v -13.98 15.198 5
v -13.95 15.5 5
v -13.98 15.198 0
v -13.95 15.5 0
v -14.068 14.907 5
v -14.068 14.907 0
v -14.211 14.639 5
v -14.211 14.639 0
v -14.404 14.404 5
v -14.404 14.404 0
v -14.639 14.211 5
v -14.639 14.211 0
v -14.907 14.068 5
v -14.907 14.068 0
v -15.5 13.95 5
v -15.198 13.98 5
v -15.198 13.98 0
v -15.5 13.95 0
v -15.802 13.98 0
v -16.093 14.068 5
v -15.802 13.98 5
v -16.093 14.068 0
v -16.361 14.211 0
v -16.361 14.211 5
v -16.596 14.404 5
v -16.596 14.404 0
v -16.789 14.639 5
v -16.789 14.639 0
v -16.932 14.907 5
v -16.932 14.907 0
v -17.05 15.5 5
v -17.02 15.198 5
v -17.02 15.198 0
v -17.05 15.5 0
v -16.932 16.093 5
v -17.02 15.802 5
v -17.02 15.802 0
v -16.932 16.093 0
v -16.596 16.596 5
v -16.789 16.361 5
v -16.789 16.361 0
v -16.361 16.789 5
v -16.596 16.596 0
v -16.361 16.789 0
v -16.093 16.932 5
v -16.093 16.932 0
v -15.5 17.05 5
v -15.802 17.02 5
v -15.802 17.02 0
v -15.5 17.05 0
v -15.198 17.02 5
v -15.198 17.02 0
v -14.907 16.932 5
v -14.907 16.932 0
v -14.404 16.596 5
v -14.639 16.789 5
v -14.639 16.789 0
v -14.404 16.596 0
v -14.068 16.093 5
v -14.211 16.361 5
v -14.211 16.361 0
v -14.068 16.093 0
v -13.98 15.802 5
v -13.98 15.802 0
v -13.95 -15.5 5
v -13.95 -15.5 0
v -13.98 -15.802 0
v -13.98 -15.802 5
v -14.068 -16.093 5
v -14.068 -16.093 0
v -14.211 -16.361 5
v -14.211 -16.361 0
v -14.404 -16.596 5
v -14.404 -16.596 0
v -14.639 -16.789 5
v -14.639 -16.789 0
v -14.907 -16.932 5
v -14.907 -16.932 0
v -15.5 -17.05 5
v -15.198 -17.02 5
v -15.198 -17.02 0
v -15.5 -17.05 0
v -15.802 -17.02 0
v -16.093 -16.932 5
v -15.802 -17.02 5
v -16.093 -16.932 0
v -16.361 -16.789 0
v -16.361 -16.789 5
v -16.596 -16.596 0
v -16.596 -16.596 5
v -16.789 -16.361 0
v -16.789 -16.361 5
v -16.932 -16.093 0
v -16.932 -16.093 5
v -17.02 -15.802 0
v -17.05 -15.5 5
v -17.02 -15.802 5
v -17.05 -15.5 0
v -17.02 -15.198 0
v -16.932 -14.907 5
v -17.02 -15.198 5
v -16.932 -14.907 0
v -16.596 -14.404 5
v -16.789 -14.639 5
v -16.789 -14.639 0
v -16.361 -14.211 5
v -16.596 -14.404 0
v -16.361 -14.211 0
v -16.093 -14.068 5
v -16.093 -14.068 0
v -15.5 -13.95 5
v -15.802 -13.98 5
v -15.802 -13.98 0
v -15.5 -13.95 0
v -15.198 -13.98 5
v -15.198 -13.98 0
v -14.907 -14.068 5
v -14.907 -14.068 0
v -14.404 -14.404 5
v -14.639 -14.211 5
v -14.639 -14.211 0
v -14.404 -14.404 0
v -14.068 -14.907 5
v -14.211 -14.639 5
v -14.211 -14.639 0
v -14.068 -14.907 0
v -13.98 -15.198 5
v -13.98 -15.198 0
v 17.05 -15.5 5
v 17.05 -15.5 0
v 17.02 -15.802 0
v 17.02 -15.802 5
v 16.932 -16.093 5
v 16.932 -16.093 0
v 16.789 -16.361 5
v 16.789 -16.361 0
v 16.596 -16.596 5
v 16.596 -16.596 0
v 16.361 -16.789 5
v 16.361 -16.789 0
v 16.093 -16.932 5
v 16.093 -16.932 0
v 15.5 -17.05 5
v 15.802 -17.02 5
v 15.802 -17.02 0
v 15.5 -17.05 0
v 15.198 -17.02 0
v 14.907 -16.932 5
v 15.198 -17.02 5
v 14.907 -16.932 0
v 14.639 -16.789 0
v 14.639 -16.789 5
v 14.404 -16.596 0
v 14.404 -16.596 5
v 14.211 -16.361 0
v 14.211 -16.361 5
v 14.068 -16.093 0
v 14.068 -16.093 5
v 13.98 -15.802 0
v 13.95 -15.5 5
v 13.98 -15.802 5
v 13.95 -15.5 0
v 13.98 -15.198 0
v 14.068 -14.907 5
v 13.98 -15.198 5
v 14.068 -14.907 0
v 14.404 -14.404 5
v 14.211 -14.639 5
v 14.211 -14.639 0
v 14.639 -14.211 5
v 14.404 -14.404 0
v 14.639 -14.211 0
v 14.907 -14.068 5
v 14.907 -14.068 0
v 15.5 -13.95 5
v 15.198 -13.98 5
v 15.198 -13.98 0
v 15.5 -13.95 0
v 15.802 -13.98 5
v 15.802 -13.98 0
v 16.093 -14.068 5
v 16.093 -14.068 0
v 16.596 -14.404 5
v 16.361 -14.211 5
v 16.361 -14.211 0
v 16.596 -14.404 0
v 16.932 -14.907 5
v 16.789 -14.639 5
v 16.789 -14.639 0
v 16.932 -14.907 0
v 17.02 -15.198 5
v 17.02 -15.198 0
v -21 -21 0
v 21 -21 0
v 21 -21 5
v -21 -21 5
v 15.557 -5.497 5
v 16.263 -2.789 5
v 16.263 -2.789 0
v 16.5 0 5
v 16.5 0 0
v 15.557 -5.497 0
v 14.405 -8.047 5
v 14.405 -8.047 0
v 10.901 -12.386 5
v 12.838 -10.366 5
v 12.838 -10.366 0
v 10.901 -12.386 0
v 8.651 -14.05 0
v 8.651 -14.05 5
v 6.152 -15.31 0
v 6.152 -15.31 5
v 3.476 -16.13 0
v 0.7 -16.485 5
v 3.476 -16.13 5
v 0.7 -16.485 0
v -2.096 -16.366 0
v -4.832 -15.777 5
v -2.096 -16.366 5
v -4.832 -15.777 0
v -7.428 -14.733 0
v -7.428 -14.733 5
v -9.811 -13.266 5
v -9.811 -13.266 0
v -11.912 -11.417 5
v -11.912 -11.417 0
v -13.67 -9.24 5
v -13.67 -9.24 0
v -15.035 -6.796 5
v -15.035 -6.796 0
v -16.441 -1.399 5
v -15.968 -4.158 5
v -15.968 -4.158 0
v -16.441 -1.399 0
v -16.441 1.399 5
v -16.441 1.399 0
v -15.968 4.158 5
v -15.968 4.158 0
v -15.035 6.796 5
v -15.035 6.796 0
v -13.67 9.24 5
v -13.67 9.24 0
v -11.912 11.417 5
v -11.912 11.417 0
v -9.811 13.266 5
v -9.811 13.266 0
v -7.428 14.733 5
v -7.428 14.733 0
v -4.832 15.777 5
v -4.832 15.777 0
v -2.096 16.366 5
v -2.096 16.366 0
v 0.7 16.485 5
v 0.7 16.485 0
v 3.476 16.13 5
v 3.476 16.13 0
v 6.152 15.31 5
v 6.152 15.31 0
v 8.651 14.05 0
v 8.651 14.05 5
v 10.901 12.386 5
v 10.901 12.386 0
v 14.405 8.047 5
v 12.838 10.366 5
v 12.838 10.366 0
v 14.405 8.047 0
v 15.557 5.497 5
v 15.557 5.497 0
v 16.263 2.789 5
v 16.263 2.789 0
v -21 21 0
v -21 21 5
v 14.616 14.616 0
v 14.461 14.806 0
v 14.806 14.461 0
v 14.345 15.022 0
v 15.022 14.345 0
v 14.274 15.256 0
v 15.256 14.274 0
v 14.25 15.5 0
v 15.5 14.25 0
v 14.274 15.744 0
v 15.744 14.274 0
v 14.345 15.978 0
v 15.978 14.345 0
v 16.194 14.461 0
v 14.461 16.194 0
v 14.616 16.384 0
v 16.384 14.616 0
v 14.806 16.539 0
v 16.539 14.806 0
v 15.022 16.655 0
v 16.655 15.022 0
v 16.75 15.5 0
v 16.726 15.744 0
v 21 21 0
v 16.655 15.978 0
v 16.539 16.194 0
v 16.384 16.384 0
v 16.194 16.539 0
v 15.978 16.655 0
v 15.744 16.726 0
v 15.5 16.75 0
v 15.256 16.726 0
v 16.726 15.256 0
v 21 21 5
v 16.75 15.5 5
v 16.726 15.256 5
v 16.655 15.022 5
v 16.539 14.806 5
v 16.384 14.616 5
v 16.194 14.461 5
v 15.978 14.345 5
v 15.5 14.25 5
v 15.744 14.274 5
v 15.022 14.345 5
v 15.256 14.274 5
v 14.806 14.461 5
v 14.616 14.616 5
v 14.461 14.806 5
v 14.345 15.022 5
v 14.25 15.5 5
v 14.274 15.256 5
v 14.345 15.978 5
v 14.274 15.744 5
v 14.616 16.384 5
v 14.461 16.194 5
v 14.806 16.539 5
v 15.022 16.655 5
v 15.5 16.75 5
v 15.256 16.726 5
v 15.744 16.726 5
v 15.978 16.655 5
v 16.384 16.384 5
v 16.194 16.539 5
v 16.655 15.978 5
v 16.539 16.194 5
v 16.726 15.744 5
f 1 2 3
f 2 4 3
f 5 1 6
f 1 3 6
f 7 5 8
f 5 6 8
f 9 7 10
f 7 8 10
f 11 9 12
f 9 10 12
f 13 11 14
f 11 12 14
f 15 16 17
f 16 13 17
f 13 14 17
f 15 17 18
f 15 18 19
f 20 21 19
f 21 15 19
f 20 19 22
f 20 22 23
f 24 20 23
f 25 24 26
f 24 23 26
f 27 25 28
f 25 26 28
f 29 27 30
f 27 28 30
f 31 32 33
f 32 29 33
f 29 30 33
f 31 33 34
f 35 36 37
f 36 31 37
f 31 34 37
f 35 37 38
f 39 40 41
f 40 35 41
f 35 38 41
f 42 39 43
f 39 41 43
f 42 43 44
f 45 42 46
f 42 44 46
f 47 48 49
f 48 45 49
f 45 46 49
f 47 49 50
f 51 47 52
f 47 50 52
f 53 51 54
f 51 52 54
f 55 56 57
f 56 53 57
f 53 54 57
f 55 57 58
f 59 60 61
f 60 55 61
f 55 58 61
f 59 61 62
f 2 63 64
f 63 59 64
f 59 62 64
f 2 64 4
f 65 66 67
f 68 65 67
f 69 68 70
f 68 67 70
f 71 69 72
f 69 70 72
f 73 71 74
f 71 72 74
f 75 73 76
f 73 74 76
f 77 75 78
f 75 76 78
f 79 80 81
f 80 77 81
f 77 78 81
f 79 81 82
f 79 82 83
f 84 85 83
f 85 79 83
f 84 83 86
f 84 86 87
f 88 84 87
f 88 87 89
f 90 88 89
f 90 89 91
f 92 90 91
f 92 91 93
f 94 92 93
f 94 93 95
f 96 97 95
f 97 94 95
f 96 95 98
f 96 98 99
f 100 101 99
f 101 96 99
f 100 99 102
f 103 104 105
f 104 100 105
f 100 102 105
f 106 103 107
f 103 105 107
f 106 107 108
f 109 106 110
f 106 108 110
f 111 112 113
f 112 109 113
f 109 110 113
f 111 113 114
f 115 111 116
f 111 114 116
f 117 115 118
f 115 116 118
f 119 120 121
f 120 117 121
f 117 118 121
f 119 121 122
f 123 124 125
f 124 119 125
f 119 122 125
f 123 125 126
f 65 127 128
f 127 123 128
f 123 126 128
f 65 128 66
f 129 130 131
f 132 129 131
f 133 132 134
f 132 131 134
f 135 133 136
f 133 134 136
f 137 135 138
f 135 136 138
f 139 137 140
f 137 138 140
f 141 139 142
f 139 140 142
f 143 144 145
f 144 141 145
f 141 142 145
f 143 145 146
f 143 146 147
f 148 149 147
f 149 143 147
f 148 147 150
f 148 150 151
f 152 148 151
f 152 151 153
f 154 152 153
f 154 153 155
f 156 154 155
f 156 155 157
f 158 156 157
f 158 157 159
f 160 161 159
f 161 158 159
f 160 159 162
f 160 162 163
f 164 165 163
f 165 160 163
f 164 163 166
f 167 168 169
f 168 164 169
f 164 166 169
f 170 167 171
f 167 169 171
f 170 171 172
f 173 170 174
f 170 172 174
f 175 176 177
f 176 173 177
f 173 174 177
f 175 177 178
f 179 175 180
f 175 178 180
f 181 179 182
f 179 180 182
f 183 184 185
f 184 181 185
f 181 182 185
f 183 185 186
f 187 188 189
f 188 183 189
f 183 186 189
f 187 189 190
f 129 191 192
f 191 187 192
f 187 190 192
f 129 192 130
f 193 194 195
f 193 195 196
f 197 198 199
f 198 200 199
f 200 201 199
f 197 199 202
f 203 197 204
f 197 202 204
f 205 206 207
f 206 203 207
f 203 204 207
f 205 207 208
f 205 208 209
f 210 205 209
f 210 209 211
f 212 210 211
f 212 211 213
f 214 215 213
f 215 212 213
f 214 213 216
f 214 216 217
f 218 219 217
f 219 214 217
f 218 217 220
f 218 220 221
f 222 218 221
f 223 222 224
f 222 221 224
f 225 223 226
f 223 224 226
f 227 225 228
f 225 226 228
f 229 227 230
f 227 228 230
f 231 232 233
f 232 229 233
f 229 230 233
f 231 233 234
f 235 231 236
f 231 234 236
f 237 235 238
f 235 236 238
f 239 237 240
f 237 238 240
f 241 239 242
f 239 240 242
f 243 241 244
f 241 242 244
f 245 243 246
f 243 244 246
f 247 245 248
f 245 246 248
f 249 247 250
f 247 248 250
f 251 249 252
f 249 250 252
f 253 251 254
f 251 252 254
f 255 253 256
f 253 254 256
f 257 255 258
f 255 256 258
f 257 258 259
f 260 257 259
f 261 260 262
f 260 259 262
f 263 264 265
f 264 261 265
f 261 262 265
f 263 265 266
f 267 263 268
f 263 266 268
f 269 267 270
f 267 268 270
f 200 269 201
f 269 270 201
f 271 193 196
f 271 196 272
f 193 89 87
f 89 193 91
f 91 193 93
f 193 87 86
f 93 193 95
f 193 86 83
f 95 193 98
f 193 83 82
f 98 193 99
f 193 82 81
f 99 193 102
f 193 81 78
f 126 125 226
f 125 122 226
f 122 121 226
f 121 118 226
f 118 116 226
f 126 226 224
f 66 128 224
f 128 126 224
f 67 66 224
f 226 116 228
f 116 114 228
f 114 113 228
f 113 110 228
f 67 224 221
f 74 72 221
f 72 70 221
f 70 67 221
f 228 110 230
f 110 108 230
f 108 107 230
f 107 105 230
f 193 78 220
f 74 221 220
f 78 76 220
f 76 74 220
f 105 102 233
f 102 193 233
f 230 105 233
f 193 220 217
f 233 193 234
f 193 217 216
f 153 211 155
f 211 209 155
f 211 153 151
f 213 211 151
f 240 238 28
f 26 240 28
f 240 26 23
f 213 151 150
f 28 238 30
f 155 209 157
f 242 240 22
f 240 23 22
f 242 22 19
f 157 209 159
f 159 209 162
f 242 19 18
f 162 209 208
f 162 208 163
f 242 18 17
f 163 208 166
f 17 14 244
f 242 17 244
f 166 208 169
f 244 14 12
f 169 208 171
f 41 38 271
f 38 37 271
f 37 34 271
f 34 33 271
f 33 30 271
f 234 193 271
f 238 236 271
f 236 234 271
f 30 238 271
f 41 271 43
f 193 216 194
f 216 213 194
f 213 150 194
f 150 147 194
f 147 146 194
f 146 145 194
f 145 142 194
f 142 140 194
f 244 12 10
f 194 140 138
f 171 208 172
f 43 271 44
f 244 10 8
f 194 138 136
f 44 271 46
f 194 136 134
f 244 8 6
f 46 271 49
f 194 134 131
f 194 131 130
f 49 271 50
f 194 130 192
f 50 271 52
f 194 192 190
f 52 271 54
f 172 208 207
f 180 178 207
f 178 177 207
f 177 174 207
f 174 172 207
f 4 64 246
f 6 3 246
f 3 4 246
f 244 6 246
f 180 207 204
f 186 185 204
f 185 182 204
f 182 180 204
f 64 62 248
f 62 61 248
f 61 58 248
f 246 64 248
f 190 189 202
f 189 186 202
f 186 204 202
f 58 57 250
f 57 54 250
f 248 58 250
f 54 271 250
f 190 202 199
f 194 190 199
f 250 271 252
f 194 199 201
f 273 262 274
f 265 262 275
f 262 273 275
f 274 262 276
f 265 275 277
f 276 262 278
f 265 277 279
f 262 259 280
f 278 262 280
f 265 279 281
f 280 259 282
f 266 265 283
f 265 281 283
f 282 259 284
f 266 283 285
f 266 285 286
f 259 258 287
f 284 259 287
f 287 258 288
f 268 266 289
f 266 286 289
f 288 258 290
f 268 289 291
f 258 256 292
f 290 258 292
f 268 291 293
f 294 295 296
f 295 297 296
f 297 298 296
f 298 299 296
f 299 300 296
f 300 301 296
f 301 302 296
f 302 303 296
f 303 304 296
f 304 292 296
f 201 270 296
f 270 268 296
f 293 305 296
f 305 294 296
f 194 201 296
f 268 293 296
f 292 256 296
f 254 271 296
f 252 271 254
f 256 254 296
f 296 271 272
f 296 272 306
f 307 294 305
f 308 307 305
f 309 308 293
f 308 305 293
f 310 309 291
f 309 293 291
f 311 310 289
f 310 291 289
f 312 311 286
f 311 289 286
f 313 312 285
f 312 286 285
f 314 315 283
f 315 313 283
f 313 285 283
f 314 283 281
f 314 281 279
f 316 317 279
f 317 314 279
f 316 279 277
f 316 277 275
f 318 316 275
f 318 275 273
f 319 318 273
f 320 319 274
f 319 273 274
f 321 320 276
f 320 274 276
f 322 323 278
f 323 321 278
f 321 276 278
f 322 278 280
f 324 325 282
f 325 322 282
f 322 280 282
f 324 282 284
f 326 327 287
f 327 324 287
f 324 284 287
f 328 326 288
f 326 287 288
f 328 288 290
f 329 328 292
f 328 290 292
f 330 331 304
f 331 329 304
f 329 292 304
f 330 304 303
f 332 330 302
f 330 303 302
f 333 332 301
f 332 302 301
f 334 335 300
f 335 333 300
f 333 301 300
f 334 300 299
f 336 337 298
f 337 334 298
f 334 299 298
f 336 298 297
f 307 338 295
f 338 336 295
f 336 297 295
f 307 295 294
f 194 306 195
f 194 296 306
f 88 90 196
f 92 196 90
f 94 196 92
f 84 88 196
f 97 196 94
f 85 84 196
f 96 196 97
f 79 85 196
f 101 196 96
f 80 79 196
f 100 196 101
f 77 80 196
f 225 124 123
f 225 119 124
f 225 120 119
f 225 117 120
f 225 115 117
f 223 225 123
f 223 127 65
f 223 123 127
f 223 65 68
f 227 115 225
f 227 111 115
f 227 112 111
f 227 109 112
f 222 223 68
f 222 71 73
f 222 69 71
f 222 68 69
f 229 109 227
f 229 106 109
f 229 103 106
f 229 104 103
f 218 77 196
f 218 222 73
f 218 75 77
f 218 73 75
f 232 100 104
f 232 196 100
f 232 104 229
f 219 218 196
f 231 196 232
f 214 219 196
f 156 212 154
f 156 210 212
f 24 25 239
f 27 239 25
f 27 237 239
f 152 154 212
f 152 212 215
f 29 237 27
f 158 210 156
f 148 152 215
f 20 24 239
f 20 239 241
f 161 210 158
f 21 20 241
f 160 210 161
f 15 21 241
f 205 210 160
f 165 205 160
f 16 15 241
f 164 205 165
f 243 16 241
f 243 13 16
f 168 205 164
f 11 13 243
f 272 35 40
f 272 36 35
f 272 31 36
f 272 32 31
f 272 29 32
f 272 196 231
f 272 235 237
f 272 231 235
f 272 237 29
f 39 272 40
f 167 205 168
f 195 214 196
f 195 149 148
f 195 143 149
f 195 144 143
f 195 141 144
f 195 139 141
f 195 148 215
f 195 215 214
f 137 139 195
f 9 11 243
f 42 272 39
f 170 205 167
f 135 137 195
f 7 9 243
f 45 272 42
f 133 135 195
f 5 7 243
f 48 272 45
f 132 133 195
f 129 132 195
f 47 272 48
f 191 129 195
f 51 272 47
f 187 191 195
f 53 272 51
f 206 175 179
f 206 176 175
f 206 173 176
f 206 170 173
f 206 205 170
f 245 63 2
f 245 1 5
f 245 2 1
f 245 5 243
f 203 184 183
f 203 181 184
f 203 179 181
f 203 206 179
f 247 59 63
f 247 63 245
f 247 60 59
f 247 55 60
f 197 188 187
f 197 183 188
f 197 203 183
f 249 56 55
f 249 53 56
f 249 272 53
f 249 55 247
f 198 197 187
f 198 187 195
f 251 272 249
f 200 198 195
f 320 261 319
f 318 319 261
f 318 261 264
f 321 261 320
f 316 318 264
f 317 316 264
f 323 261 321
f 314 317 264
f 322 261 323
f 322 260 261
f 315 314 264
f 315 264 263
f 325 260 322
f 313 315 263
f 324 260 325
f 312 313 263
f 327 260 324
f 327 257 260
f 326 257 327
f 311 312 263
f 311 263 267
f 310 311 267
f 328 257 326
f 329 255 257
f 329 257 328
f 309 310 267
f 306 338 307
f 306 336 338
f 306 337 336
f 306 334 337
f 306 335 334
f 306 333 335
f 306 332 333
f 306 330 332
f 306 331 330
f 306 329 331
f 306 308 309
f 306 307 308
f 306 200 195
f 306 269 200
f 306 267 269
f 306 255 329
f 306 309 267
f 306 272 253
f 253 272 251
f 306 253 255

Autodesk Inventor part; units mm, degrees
ref_plane "YZ Plane" through (0, 0, 0) normal (1, 0, 0) x (0, 1, 0)
ref_plane "XZ Plane" through (0, 0, 0) normal (0, 1, 0) x (-1, 0, 0)
ref_plane "XY Plane" through (0, 0, 0) normal (0, 0, 1) x (1, 0, 0)
sketch "Sketch1" plane through (0, 0, 0) normal (0, 0, 1) x (1, 0, 0)
  circle A0 centre (0, 0) radius 16.5 projected
  circle A1 centre (15.5, 15.5) radius 1.25 projected
  circle A2 centre (15.5, -15.5) radius 1.55 projected
  circle A3 centre (-15.5, -15.5) radius 1.55 projected
  circle A4 centre (-15.5, 15.5) radius 1.55 projected
  line L0 (-21, 21) -> (21, 21)
  line L1 (21, 21) -> (21, -21)
  line L2 (21, -21) -> (-21, -21)
  line L3 (-21, -21) -> (-21, 21)
  line L4 (-21, 21) -> (21, -21) construction
  line L5 (21, 21) -> (-21, -21) construction
  point P0 (0, 0)
  dimension "d0" = 42
  dimension "d1" = 42
extrude "Extrusion1" add sketch "Sketch1" along normal blind 5
equation "\"BendRadius\" = Thickness"
equation "\"BendReliefWidth\" = Thickness"
equation "\"BendReliefDepth\" = 0.5 * Thickness"
equation "\"CornerReliefSize\" = 4 * Thickness"
equation "\"MinimumRemnant\" = 2 * Thickness"
equation "\"TransitionRadius\" = BendRadius"
equation "\"JacobiRadiusSize\" = Thickness"
equation "\"GapSize\" = Thickness"
equation "\"Thickness\" = 0.5"
properties part number "Motor Mount V2.1"
